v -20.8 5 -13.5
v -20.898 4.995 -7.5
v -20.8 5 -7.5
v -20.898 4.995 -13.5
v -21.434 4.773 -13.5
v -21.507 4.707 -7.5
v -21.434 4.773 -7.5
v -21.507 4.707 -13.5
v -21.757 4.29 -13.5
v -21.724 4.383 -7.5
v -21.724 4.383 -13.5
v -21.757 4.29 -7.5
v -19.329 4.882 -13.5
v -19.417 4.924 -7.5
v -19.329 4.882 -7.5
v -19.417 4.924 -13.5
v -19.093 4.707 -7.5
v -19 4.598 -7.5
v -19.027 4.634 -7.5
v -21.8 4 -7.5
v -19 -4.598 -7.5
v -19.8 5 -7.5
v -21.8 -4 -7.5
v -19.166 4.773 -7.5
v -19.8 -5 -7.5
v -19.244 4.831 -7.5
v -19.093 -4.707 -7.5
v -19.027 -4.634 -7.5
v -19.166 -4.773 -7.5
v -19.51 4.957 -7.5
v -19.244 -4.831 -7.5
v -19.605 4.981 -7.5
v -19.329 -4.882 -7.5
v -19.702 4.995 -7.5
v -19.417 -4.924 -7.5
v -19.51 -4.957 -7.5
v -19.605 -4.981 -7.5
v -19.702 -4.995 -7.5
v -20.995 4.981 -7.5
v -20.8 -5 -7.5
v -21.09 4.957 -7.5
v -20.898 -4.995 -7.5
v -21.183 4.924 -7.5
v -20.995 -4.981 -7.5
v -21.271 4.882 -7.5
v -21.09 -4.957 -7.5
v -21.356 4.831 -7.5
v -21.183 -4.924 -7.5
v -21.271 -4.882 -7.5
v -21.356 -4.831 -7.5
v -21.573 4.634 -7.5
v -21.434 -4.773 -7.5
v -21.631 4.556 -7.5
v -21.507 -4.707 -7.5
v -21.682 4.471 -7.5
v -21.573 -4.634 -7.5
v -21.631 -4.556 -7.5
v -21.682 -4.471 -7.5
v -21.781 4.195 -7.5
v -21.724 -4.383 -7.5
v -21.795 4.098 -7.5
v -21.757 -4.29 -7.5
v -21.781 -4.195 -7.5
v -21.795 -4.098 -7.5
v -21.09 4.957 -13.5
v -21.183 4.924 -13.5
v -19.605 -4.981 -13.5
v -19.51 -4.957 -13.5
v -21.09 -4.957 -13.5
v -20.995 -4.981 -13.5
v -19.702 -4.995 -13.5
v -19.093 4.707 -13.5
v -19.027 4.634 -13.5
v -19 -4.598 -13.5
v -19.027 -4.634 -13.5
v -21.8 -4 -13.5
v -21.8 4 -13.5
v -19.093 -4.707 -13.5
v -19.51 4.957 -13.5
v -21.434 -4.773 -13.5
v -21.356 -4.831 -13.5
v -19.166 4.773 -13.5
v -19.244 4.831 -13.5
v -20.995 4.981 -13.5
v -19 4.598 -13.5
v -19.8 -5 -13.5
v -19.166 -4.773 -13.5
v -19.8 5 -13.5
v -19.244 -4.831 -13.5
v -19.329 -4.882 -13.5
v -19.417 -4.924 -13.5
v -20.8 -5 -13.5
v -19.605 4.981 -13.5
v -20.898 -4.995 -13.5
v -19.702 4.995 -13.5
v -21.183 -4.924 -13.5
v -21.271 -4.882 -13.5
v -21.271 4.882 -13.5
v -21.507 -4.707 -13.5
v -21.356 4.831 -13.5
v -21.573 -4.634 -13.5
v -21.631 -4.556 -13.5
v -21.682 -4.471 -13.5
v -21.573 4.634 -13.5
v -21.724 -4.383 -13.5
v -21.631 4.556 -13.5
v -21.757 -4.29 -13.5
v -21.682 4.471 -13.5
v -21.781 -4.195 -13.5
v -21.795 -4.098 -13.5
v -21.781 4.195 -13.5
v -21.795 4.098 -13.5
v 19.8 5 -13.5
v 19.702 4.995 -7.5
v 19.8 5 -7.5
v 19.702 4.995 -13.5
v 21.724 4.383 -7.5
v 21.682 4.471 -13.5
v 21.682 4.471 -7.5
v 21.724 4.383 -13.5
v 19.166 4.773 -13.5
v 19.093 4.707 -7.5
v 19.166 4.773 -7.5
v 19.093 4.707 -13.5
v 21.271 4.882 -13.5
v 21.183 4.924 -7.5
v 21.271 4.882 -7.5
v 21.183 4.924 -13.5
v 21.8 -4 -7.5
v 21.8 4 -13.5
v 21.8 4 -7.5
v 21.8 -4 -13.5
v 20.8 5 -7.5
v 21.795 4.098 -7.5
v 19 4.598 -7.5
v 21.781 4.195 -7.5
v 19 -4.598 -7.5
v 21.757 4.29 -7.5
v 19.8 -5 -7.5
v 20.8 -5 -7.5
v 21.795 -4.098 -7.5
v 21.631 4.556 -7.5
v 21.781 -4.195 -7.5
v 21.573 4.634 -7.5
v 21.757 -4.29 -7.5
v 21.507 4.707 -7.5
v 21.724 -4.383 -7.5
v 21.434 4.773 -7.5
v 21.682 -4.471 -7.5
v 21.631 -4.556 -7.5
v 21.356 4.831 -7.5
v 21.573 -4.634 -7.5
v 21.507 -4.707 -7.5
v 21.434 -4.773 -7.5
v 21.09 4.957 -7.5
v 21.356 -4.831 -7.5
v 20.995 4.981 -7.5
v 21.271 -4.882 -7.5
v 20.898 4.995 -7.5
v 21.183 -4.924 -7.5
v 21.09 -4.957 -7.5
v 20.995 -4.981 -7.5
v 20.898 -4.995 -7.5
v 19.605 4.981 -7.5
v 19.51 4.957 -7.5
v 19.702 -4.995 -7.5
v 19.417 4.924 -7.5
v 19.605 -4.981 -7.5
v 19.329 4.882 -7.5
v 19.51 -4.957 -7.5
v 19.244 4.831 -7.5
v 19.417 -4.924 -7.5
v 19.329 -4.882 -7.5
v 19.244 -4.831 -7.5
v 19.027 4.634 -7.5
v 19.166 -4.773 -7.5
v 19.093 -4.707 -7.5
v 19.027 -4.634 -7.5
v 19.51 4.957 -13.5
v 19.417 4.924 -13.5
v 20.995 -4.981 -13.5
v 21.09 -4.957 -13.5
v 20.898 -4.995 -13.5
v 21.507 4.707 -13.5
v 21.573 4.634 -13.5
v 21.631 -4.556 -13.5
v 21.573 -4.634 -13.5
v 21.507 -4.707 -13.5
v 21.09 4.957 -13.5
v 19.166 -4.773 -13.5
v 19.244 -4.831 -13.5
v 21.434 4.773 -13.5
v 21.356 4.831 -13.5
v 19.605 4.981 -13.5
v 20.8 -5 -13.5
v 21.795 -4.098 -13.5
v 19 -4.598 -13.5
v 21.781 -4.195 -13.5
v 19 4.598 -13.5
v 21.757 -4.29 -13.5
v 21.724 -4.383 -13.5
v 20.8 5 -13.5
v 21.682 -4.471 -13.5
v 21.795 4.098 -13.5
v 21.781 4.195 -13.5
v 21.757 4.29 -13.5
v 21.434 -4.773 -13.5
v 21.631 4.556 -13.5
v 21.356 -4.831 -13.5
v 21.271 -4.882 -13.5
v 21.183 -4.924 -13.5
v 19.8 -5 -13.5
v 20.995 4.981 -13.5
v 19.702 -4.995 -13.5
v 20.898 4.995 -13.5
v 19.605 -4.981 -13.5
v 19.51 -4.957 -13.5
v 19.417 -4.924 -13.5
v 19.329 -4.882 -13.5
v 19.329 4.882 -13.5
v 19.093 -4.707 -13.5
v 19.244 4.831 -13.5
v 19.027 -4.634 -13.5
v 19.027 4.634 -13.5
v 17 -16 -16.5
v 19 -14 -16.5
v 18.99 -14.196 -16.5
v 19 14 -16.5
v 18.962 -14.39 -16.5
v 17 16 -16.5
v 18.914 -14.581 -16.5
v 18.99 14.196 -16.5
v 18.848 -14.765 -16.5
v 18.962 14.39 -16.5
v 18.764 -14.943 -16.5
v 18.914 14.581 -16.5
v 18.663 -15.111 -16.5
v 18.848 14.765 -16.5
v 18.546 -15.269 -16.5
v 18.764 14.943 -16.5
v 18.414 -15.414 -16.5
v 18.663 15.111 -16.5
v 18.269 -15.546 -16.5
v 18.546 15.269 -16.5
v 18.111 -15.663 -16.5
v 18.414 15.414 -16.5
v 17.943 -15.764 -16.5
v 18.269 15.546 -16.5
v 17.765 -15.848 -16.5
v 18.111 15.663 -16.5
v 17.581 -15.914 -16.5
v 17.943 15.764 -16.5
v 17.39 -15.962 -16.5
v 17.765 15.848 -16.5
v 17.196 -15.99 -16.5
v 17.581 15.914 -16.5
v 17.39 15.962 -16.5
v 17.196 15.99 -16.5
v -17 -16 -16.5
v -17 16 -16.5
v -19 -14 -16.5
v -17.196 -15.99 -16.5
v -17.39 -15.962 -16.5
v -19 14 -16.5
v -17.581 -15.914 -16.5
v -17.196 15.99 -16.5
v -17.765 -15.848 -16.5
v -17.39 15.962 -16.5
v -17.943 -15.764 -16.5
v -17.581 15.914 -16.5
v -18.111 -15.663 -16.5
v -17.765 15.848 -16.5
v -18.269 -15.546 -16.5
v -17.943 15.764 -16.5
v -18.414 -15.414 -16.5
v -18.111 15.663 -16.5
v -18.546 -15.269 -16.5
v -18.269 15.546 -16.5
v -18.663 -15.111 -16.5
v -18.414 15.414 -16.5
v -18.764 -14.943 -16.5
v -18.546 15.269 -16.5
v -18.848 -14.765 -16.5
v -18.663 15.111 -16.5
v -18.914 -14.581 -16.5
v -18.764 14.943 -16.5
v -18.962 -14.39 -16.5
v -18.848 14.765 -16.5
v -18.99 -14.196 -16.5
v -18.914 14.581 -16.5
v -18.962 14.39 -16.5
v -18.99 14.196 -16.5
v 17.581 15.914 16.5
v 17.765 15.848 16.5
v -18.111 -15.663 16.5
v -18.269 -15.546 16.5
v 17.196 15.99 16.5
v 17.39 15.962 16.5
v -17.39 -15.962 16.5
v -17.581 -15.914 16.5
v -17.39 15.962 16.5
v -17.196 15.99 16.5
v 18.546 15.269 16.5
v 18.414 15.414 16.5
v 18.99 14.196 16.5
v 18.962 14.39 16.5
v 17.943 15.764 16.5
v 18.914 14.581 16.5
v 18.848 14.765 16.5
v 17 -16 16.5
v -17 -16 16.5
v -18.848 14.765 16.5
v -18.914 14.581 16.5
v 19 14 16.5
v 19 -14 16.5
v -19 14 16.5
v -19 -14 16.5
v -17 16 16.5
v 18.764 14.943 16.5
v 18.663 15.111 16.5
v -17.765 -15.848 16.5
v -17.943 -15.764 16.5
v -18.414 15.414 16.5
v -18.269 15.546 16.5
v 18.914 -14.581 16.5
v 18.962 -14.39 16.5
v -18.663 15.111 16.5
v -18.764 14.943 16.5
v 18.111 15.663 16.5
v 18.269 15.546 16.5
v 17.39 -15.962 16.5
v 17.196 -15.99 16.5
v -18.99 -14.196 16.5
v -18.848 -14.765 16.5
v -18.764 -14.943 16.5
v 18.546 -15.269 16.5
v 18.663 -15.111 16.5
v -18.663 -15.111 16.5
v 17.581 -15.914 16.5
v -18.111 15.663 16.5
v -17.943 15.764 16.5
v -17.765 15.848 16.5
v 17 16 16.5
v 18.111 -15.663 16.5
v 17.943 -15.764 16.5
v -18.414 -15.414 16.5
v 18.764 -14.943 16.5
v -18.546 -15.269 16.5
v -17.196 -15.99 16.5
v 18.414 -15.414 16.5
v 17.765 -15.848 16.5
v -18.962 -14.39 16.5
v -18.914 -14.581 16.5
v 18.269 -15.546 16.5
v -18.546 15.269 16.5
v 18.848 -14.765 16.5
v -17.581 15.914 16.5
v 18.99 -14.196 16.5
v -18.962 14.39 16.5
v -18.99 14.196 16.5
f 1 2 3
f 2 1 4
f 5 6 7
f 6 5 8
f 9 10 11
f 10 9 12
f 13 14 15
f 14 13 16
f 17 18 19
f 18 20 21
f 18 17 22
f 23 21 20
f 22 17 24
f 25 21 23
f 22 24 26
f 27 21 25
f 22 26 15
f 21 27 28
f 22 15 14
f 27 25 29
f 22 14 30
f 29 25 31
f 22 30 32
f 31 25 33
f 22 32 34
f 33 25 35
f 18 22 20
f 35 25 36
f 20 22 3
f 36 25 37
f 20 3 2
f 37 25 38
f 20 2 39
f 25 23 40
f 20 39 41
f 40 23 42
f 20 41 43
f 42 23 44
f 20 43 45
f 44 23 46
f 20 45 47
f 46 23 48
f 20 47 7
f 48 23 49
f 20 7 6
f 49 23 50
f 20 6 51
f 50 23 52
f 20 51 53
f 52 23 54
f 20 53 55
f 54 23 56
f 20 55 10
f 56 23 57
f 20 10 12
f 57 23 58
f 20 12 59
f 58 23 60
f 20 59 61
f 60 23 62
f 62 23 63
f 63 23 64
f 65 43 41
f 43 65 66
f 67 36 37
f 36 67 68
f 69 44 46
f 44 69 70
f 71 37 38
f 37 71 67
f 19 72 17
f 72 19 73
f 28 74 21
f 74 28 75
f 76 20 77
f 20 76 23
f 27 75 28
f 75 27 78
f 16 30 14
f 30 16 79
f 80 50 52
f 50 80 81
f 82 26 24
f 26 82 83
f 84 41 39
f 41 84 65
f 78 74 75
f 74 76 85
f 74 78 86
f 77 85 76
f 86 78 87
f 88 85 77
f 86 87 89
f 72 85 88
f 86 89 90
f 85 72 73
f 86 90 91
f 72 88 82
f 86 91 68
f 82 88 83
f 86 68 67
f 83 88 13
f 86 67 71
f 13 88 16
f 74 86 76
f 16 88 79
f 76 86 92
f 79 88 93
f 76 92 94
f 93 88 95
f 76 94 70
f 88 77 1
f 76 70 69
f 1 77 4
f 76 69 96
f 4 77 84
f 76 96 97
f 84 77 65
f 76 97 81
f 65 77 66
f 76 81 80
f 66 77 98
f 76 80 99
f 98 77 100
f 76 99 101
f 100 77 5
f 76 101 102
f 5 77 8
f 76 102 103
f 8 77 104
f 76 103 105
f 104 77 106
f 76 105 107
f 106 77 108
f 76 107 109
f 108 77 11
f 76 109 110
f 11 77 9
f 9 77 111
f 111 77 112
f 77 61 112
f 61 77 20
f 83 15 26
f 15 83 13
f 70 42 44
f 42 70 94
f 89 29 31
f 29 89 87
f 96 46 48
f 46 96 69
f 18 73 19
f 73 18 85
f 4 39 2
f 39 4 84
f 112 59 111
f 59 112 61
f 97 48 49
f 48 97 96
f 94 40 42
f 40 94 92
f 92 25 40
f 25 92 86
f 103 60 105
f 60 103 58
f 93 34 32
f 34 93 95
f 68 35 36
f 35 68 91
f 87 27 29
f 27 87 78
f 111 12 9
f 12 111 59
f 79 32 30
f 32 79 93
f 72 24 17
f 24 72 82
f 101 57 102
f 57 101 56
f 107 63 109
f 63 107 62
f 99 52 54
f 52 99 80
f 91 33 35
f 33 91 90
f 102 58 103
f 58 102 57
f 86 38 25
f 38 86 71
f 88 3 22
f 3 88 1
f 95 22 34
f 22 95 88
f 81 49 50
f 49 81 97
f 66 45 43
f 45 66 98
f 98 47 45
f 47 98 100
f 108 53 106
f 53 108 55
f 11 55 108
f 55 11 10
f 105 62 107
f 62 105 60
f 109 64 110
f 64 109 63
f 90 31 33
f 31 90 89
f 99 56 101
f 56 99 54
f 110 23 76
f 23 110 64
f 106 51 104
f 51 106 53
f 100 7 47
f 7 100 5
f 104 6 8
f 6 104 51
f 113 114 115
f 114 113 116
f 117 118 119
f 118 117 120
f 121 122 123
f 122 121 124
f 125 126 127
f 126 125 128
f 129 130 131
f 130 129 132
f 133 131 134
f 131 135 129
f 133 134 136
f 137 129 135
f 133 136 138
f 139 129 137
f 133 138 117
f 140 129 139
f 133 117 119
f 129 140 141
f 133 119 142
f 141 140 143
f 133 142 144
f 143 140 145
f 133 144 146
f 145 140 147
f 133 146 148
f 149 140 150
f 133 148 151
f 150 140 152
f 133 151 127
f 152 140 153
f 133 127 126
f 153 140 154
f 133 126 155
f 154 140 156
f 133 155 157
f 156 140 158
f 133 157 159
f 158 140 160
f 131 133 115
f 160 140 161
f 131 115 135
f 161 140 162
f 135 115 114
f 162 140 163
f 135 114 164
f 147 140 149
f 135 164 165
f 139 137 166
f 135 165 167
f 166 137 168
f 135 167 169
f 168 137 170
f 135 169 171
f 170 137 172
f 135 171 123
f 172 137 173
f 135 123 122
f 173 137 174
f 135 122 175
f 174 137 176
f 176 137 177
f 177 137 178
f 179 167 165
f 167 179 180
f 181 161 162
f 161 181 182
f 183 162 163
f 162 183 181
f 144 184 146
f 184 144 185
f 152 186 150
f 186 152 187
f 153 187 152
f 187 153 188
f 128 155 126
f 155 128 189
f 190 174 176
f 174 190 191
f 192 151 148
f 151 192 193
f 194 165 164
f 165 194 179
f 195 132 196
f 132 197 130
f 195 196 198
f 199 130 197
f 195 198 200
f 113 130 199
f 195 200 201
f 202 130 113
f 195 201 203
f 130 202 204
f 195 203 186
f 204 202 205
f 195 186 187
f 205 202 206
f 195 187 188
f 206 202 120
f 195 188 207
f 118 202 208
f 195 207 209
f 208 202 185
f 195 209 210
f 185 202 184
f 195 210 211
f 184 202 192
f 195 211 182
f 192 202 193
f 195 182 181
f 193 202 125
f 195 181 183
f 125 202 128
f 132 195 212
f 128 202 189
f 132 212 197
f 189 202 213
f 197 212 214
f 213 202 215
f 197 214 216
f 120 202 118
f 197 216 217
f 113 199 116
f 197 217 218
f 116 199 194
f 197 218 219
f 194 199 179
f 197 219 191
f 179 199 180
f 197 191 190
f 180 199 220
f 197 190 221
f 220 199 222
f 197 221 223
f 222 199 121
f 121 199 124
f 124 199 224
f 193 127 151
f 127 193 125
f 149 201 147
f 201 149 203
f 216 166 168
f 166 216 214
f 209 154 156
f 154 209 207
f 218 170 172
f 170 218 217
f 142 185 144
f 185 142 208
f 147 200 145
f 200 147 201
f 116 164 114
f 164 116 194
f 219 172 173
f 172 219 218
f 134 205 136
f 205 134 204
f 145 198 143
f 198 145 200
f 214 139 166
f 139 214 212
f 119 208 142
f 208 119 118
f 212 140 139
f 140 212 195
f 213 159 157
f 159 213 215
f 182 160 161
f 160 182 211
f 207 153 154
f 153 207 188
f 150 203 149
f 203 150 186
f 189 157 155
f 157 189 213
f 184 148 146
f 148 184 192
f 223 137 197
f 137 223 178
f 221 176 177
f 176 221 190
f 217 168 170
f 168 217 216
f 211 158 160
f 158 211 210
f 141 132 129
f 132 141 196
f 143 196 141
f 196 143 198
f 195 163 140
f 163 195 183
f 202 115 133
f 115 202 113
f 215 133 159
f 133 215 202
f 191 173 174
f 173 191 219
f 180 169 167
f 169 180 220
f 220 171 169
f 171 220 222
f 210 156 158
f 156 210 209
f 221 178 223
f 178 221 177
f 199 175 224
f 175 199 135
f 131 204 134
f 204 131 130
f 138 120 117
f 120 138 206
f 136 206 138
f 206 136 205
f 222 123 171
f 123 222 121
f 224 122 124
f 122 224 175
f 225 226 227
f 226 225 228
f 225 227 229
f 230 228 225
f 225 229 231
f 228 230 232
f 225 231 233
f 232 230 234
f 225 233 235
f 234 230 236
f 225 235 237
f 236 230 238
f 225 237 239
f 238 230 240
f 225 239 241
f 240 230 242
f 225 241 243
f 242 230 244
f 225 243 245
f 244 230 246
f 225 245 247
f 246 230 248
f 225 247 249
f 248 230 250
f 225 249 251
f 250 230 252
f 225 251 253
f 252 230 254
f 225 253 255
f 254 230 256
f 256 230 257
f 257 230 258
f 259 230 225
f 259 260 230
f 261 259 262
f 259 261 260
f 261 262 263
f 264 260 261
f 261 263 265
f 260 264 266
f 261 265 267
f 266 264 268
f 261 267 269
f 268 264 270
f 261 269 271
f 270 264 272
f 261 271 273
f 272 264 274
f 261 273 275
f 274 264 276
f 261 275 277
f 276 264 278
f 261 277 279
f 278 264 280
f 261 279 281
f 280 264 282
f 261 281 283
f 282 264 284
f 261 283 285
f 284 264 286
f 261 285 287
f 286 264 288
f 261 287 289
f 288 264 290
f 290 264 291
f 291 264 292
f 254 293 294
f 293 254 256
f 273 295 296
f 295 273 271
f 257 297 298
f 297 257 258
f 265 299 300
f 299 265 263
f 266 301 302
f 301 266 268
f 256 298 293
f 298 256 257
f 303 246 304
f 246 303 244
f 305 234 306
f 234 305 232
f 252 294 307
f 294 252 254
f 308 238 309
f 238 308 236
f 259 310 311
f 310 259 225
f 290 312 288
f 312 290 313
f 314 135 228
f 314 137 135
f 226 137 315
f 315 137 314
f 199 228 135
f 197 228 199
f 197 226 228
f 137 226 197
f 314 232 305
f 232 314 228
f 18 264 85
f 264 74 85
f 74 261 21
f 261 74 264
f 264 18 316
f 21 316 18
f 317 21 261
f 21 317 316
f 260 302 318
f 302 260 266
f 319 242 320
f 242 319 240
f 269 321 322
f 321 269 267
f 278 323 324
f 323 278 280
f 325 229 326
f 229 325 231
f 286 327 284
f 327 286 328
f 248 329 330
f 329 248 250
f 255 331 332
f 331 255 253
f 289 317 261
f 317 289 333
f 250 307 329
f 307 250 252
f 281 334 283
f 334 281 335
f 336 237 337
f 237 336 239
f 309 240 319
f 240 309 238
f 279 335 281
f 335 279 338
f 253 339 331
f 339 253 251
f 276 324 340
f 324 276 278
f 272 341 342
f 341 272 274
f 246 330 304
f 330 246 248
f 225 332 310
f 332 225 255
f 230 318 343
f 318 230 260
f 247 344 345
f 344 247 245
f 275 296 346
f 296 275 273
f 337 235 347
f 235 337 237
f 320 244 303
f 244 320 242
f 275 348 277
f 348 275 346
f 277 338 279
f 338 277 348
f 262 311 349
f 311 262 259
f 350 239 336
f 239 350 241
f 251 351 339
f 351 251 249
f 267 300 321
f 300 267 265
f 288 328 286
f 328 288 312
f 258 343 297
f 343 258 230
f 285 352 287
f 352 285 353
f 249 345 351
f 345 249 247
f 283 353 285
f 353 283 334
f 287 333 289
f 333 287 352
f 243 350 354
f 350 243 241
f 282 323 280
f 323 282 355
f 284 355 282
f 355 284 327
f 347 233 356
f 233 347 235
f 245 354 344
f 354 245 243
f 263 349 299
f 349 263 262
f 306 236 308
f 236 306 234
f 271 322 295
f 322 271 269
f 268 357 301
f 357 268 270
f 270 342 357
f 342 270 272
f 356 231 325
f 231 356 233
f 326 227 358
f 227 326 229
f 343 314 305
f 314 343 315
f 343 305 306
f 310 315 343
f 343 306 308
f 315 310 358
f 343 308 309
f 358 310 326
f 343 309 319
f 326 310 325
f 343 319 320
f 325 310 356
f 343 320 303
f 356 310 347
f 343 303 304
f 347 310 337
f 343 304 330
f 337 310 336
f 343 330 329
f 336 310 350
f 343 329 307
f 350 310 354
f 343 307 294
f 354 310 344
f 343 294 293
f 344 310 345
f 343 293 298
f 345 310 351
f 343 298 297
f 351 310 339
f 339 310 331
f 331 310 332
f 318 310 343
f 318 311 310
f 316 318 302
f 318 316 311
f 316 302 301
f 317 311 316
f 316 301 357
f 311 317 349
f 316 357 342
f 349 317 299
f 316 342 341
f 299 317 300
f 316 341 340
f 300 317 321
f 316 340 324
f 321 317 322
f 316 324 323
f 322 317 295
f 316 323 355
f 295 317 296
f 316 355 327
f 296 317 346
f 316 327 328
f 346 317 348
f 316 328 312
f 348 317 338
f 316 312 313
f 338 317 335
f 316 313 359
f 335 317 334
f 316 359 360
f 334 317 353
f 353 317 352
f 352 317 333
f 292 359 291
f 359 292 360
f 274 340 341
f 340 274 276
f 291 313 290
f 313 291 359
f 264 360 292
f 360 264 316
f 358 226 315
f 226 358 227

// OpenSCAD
$fn=64;

L=38.0;
W=32.0;
H=33.0;

module rounded_box(size=[10,10,10], r=1.5){
    x=size[0]; y=size[1]; z=size[2];
    r2=min(r, min(x,y)/2);
    hull(){
        for (sx=[-1,1], sy=[-1,1])
            translate([sx*(x/2-r2), sy*(y/2-r2), 0])
                cylinder(h=z, r=r2, center=true);
    }
}

module lead(d=1.2, len=10, bend=0){
    union(){
        cylinder(h=len, d=d, center=false);
        if (bend > 0)
            translate([0,0,len])
                rotate([0,90,0])
                    cylinder(h=bend, d=d, center=false);
    }
}

module transformer_body(){
    // Main body
    color([0.15,0.15,0.15])
    rounded_box([L,W,H], r=2.0);

    // Top label plate
    color([0.85,0.85,0.85])
    translate([0,0,H/2-0.6])
        rounded_box([L-6, W-6, 1.2], r=1.2);

    // Side mounting ears (small protrusions)
    ear_t=3.0;
    ear_w=10.0;
    ear_h=6.0;
    for (sx=[-1,1]){
        color([0.15,0.15,0.15])
        translate([sx*(L/2 + ear_t/2 - 0.2), 0, -H/2 + ear_h/2 + 3])
            rounded_box([ear_t, ear_w, ear_h], r=1.0);
    }

    // Leads (two on each side)
    lead_d=1.2;
    lead_len=9.0;
    lead_y=8.0;
    lead_z=-H/2;
    for (sx=[-1,1]){
        for (sy=[-1,1]){
            color([0.8,0.7,0.2])
            translate([sx*(L/2-6), sy*lead_y, lead_z])
                lead(d=lead_d, len=lead_len, bend=0);
        }
    }
}

transformer_body();
